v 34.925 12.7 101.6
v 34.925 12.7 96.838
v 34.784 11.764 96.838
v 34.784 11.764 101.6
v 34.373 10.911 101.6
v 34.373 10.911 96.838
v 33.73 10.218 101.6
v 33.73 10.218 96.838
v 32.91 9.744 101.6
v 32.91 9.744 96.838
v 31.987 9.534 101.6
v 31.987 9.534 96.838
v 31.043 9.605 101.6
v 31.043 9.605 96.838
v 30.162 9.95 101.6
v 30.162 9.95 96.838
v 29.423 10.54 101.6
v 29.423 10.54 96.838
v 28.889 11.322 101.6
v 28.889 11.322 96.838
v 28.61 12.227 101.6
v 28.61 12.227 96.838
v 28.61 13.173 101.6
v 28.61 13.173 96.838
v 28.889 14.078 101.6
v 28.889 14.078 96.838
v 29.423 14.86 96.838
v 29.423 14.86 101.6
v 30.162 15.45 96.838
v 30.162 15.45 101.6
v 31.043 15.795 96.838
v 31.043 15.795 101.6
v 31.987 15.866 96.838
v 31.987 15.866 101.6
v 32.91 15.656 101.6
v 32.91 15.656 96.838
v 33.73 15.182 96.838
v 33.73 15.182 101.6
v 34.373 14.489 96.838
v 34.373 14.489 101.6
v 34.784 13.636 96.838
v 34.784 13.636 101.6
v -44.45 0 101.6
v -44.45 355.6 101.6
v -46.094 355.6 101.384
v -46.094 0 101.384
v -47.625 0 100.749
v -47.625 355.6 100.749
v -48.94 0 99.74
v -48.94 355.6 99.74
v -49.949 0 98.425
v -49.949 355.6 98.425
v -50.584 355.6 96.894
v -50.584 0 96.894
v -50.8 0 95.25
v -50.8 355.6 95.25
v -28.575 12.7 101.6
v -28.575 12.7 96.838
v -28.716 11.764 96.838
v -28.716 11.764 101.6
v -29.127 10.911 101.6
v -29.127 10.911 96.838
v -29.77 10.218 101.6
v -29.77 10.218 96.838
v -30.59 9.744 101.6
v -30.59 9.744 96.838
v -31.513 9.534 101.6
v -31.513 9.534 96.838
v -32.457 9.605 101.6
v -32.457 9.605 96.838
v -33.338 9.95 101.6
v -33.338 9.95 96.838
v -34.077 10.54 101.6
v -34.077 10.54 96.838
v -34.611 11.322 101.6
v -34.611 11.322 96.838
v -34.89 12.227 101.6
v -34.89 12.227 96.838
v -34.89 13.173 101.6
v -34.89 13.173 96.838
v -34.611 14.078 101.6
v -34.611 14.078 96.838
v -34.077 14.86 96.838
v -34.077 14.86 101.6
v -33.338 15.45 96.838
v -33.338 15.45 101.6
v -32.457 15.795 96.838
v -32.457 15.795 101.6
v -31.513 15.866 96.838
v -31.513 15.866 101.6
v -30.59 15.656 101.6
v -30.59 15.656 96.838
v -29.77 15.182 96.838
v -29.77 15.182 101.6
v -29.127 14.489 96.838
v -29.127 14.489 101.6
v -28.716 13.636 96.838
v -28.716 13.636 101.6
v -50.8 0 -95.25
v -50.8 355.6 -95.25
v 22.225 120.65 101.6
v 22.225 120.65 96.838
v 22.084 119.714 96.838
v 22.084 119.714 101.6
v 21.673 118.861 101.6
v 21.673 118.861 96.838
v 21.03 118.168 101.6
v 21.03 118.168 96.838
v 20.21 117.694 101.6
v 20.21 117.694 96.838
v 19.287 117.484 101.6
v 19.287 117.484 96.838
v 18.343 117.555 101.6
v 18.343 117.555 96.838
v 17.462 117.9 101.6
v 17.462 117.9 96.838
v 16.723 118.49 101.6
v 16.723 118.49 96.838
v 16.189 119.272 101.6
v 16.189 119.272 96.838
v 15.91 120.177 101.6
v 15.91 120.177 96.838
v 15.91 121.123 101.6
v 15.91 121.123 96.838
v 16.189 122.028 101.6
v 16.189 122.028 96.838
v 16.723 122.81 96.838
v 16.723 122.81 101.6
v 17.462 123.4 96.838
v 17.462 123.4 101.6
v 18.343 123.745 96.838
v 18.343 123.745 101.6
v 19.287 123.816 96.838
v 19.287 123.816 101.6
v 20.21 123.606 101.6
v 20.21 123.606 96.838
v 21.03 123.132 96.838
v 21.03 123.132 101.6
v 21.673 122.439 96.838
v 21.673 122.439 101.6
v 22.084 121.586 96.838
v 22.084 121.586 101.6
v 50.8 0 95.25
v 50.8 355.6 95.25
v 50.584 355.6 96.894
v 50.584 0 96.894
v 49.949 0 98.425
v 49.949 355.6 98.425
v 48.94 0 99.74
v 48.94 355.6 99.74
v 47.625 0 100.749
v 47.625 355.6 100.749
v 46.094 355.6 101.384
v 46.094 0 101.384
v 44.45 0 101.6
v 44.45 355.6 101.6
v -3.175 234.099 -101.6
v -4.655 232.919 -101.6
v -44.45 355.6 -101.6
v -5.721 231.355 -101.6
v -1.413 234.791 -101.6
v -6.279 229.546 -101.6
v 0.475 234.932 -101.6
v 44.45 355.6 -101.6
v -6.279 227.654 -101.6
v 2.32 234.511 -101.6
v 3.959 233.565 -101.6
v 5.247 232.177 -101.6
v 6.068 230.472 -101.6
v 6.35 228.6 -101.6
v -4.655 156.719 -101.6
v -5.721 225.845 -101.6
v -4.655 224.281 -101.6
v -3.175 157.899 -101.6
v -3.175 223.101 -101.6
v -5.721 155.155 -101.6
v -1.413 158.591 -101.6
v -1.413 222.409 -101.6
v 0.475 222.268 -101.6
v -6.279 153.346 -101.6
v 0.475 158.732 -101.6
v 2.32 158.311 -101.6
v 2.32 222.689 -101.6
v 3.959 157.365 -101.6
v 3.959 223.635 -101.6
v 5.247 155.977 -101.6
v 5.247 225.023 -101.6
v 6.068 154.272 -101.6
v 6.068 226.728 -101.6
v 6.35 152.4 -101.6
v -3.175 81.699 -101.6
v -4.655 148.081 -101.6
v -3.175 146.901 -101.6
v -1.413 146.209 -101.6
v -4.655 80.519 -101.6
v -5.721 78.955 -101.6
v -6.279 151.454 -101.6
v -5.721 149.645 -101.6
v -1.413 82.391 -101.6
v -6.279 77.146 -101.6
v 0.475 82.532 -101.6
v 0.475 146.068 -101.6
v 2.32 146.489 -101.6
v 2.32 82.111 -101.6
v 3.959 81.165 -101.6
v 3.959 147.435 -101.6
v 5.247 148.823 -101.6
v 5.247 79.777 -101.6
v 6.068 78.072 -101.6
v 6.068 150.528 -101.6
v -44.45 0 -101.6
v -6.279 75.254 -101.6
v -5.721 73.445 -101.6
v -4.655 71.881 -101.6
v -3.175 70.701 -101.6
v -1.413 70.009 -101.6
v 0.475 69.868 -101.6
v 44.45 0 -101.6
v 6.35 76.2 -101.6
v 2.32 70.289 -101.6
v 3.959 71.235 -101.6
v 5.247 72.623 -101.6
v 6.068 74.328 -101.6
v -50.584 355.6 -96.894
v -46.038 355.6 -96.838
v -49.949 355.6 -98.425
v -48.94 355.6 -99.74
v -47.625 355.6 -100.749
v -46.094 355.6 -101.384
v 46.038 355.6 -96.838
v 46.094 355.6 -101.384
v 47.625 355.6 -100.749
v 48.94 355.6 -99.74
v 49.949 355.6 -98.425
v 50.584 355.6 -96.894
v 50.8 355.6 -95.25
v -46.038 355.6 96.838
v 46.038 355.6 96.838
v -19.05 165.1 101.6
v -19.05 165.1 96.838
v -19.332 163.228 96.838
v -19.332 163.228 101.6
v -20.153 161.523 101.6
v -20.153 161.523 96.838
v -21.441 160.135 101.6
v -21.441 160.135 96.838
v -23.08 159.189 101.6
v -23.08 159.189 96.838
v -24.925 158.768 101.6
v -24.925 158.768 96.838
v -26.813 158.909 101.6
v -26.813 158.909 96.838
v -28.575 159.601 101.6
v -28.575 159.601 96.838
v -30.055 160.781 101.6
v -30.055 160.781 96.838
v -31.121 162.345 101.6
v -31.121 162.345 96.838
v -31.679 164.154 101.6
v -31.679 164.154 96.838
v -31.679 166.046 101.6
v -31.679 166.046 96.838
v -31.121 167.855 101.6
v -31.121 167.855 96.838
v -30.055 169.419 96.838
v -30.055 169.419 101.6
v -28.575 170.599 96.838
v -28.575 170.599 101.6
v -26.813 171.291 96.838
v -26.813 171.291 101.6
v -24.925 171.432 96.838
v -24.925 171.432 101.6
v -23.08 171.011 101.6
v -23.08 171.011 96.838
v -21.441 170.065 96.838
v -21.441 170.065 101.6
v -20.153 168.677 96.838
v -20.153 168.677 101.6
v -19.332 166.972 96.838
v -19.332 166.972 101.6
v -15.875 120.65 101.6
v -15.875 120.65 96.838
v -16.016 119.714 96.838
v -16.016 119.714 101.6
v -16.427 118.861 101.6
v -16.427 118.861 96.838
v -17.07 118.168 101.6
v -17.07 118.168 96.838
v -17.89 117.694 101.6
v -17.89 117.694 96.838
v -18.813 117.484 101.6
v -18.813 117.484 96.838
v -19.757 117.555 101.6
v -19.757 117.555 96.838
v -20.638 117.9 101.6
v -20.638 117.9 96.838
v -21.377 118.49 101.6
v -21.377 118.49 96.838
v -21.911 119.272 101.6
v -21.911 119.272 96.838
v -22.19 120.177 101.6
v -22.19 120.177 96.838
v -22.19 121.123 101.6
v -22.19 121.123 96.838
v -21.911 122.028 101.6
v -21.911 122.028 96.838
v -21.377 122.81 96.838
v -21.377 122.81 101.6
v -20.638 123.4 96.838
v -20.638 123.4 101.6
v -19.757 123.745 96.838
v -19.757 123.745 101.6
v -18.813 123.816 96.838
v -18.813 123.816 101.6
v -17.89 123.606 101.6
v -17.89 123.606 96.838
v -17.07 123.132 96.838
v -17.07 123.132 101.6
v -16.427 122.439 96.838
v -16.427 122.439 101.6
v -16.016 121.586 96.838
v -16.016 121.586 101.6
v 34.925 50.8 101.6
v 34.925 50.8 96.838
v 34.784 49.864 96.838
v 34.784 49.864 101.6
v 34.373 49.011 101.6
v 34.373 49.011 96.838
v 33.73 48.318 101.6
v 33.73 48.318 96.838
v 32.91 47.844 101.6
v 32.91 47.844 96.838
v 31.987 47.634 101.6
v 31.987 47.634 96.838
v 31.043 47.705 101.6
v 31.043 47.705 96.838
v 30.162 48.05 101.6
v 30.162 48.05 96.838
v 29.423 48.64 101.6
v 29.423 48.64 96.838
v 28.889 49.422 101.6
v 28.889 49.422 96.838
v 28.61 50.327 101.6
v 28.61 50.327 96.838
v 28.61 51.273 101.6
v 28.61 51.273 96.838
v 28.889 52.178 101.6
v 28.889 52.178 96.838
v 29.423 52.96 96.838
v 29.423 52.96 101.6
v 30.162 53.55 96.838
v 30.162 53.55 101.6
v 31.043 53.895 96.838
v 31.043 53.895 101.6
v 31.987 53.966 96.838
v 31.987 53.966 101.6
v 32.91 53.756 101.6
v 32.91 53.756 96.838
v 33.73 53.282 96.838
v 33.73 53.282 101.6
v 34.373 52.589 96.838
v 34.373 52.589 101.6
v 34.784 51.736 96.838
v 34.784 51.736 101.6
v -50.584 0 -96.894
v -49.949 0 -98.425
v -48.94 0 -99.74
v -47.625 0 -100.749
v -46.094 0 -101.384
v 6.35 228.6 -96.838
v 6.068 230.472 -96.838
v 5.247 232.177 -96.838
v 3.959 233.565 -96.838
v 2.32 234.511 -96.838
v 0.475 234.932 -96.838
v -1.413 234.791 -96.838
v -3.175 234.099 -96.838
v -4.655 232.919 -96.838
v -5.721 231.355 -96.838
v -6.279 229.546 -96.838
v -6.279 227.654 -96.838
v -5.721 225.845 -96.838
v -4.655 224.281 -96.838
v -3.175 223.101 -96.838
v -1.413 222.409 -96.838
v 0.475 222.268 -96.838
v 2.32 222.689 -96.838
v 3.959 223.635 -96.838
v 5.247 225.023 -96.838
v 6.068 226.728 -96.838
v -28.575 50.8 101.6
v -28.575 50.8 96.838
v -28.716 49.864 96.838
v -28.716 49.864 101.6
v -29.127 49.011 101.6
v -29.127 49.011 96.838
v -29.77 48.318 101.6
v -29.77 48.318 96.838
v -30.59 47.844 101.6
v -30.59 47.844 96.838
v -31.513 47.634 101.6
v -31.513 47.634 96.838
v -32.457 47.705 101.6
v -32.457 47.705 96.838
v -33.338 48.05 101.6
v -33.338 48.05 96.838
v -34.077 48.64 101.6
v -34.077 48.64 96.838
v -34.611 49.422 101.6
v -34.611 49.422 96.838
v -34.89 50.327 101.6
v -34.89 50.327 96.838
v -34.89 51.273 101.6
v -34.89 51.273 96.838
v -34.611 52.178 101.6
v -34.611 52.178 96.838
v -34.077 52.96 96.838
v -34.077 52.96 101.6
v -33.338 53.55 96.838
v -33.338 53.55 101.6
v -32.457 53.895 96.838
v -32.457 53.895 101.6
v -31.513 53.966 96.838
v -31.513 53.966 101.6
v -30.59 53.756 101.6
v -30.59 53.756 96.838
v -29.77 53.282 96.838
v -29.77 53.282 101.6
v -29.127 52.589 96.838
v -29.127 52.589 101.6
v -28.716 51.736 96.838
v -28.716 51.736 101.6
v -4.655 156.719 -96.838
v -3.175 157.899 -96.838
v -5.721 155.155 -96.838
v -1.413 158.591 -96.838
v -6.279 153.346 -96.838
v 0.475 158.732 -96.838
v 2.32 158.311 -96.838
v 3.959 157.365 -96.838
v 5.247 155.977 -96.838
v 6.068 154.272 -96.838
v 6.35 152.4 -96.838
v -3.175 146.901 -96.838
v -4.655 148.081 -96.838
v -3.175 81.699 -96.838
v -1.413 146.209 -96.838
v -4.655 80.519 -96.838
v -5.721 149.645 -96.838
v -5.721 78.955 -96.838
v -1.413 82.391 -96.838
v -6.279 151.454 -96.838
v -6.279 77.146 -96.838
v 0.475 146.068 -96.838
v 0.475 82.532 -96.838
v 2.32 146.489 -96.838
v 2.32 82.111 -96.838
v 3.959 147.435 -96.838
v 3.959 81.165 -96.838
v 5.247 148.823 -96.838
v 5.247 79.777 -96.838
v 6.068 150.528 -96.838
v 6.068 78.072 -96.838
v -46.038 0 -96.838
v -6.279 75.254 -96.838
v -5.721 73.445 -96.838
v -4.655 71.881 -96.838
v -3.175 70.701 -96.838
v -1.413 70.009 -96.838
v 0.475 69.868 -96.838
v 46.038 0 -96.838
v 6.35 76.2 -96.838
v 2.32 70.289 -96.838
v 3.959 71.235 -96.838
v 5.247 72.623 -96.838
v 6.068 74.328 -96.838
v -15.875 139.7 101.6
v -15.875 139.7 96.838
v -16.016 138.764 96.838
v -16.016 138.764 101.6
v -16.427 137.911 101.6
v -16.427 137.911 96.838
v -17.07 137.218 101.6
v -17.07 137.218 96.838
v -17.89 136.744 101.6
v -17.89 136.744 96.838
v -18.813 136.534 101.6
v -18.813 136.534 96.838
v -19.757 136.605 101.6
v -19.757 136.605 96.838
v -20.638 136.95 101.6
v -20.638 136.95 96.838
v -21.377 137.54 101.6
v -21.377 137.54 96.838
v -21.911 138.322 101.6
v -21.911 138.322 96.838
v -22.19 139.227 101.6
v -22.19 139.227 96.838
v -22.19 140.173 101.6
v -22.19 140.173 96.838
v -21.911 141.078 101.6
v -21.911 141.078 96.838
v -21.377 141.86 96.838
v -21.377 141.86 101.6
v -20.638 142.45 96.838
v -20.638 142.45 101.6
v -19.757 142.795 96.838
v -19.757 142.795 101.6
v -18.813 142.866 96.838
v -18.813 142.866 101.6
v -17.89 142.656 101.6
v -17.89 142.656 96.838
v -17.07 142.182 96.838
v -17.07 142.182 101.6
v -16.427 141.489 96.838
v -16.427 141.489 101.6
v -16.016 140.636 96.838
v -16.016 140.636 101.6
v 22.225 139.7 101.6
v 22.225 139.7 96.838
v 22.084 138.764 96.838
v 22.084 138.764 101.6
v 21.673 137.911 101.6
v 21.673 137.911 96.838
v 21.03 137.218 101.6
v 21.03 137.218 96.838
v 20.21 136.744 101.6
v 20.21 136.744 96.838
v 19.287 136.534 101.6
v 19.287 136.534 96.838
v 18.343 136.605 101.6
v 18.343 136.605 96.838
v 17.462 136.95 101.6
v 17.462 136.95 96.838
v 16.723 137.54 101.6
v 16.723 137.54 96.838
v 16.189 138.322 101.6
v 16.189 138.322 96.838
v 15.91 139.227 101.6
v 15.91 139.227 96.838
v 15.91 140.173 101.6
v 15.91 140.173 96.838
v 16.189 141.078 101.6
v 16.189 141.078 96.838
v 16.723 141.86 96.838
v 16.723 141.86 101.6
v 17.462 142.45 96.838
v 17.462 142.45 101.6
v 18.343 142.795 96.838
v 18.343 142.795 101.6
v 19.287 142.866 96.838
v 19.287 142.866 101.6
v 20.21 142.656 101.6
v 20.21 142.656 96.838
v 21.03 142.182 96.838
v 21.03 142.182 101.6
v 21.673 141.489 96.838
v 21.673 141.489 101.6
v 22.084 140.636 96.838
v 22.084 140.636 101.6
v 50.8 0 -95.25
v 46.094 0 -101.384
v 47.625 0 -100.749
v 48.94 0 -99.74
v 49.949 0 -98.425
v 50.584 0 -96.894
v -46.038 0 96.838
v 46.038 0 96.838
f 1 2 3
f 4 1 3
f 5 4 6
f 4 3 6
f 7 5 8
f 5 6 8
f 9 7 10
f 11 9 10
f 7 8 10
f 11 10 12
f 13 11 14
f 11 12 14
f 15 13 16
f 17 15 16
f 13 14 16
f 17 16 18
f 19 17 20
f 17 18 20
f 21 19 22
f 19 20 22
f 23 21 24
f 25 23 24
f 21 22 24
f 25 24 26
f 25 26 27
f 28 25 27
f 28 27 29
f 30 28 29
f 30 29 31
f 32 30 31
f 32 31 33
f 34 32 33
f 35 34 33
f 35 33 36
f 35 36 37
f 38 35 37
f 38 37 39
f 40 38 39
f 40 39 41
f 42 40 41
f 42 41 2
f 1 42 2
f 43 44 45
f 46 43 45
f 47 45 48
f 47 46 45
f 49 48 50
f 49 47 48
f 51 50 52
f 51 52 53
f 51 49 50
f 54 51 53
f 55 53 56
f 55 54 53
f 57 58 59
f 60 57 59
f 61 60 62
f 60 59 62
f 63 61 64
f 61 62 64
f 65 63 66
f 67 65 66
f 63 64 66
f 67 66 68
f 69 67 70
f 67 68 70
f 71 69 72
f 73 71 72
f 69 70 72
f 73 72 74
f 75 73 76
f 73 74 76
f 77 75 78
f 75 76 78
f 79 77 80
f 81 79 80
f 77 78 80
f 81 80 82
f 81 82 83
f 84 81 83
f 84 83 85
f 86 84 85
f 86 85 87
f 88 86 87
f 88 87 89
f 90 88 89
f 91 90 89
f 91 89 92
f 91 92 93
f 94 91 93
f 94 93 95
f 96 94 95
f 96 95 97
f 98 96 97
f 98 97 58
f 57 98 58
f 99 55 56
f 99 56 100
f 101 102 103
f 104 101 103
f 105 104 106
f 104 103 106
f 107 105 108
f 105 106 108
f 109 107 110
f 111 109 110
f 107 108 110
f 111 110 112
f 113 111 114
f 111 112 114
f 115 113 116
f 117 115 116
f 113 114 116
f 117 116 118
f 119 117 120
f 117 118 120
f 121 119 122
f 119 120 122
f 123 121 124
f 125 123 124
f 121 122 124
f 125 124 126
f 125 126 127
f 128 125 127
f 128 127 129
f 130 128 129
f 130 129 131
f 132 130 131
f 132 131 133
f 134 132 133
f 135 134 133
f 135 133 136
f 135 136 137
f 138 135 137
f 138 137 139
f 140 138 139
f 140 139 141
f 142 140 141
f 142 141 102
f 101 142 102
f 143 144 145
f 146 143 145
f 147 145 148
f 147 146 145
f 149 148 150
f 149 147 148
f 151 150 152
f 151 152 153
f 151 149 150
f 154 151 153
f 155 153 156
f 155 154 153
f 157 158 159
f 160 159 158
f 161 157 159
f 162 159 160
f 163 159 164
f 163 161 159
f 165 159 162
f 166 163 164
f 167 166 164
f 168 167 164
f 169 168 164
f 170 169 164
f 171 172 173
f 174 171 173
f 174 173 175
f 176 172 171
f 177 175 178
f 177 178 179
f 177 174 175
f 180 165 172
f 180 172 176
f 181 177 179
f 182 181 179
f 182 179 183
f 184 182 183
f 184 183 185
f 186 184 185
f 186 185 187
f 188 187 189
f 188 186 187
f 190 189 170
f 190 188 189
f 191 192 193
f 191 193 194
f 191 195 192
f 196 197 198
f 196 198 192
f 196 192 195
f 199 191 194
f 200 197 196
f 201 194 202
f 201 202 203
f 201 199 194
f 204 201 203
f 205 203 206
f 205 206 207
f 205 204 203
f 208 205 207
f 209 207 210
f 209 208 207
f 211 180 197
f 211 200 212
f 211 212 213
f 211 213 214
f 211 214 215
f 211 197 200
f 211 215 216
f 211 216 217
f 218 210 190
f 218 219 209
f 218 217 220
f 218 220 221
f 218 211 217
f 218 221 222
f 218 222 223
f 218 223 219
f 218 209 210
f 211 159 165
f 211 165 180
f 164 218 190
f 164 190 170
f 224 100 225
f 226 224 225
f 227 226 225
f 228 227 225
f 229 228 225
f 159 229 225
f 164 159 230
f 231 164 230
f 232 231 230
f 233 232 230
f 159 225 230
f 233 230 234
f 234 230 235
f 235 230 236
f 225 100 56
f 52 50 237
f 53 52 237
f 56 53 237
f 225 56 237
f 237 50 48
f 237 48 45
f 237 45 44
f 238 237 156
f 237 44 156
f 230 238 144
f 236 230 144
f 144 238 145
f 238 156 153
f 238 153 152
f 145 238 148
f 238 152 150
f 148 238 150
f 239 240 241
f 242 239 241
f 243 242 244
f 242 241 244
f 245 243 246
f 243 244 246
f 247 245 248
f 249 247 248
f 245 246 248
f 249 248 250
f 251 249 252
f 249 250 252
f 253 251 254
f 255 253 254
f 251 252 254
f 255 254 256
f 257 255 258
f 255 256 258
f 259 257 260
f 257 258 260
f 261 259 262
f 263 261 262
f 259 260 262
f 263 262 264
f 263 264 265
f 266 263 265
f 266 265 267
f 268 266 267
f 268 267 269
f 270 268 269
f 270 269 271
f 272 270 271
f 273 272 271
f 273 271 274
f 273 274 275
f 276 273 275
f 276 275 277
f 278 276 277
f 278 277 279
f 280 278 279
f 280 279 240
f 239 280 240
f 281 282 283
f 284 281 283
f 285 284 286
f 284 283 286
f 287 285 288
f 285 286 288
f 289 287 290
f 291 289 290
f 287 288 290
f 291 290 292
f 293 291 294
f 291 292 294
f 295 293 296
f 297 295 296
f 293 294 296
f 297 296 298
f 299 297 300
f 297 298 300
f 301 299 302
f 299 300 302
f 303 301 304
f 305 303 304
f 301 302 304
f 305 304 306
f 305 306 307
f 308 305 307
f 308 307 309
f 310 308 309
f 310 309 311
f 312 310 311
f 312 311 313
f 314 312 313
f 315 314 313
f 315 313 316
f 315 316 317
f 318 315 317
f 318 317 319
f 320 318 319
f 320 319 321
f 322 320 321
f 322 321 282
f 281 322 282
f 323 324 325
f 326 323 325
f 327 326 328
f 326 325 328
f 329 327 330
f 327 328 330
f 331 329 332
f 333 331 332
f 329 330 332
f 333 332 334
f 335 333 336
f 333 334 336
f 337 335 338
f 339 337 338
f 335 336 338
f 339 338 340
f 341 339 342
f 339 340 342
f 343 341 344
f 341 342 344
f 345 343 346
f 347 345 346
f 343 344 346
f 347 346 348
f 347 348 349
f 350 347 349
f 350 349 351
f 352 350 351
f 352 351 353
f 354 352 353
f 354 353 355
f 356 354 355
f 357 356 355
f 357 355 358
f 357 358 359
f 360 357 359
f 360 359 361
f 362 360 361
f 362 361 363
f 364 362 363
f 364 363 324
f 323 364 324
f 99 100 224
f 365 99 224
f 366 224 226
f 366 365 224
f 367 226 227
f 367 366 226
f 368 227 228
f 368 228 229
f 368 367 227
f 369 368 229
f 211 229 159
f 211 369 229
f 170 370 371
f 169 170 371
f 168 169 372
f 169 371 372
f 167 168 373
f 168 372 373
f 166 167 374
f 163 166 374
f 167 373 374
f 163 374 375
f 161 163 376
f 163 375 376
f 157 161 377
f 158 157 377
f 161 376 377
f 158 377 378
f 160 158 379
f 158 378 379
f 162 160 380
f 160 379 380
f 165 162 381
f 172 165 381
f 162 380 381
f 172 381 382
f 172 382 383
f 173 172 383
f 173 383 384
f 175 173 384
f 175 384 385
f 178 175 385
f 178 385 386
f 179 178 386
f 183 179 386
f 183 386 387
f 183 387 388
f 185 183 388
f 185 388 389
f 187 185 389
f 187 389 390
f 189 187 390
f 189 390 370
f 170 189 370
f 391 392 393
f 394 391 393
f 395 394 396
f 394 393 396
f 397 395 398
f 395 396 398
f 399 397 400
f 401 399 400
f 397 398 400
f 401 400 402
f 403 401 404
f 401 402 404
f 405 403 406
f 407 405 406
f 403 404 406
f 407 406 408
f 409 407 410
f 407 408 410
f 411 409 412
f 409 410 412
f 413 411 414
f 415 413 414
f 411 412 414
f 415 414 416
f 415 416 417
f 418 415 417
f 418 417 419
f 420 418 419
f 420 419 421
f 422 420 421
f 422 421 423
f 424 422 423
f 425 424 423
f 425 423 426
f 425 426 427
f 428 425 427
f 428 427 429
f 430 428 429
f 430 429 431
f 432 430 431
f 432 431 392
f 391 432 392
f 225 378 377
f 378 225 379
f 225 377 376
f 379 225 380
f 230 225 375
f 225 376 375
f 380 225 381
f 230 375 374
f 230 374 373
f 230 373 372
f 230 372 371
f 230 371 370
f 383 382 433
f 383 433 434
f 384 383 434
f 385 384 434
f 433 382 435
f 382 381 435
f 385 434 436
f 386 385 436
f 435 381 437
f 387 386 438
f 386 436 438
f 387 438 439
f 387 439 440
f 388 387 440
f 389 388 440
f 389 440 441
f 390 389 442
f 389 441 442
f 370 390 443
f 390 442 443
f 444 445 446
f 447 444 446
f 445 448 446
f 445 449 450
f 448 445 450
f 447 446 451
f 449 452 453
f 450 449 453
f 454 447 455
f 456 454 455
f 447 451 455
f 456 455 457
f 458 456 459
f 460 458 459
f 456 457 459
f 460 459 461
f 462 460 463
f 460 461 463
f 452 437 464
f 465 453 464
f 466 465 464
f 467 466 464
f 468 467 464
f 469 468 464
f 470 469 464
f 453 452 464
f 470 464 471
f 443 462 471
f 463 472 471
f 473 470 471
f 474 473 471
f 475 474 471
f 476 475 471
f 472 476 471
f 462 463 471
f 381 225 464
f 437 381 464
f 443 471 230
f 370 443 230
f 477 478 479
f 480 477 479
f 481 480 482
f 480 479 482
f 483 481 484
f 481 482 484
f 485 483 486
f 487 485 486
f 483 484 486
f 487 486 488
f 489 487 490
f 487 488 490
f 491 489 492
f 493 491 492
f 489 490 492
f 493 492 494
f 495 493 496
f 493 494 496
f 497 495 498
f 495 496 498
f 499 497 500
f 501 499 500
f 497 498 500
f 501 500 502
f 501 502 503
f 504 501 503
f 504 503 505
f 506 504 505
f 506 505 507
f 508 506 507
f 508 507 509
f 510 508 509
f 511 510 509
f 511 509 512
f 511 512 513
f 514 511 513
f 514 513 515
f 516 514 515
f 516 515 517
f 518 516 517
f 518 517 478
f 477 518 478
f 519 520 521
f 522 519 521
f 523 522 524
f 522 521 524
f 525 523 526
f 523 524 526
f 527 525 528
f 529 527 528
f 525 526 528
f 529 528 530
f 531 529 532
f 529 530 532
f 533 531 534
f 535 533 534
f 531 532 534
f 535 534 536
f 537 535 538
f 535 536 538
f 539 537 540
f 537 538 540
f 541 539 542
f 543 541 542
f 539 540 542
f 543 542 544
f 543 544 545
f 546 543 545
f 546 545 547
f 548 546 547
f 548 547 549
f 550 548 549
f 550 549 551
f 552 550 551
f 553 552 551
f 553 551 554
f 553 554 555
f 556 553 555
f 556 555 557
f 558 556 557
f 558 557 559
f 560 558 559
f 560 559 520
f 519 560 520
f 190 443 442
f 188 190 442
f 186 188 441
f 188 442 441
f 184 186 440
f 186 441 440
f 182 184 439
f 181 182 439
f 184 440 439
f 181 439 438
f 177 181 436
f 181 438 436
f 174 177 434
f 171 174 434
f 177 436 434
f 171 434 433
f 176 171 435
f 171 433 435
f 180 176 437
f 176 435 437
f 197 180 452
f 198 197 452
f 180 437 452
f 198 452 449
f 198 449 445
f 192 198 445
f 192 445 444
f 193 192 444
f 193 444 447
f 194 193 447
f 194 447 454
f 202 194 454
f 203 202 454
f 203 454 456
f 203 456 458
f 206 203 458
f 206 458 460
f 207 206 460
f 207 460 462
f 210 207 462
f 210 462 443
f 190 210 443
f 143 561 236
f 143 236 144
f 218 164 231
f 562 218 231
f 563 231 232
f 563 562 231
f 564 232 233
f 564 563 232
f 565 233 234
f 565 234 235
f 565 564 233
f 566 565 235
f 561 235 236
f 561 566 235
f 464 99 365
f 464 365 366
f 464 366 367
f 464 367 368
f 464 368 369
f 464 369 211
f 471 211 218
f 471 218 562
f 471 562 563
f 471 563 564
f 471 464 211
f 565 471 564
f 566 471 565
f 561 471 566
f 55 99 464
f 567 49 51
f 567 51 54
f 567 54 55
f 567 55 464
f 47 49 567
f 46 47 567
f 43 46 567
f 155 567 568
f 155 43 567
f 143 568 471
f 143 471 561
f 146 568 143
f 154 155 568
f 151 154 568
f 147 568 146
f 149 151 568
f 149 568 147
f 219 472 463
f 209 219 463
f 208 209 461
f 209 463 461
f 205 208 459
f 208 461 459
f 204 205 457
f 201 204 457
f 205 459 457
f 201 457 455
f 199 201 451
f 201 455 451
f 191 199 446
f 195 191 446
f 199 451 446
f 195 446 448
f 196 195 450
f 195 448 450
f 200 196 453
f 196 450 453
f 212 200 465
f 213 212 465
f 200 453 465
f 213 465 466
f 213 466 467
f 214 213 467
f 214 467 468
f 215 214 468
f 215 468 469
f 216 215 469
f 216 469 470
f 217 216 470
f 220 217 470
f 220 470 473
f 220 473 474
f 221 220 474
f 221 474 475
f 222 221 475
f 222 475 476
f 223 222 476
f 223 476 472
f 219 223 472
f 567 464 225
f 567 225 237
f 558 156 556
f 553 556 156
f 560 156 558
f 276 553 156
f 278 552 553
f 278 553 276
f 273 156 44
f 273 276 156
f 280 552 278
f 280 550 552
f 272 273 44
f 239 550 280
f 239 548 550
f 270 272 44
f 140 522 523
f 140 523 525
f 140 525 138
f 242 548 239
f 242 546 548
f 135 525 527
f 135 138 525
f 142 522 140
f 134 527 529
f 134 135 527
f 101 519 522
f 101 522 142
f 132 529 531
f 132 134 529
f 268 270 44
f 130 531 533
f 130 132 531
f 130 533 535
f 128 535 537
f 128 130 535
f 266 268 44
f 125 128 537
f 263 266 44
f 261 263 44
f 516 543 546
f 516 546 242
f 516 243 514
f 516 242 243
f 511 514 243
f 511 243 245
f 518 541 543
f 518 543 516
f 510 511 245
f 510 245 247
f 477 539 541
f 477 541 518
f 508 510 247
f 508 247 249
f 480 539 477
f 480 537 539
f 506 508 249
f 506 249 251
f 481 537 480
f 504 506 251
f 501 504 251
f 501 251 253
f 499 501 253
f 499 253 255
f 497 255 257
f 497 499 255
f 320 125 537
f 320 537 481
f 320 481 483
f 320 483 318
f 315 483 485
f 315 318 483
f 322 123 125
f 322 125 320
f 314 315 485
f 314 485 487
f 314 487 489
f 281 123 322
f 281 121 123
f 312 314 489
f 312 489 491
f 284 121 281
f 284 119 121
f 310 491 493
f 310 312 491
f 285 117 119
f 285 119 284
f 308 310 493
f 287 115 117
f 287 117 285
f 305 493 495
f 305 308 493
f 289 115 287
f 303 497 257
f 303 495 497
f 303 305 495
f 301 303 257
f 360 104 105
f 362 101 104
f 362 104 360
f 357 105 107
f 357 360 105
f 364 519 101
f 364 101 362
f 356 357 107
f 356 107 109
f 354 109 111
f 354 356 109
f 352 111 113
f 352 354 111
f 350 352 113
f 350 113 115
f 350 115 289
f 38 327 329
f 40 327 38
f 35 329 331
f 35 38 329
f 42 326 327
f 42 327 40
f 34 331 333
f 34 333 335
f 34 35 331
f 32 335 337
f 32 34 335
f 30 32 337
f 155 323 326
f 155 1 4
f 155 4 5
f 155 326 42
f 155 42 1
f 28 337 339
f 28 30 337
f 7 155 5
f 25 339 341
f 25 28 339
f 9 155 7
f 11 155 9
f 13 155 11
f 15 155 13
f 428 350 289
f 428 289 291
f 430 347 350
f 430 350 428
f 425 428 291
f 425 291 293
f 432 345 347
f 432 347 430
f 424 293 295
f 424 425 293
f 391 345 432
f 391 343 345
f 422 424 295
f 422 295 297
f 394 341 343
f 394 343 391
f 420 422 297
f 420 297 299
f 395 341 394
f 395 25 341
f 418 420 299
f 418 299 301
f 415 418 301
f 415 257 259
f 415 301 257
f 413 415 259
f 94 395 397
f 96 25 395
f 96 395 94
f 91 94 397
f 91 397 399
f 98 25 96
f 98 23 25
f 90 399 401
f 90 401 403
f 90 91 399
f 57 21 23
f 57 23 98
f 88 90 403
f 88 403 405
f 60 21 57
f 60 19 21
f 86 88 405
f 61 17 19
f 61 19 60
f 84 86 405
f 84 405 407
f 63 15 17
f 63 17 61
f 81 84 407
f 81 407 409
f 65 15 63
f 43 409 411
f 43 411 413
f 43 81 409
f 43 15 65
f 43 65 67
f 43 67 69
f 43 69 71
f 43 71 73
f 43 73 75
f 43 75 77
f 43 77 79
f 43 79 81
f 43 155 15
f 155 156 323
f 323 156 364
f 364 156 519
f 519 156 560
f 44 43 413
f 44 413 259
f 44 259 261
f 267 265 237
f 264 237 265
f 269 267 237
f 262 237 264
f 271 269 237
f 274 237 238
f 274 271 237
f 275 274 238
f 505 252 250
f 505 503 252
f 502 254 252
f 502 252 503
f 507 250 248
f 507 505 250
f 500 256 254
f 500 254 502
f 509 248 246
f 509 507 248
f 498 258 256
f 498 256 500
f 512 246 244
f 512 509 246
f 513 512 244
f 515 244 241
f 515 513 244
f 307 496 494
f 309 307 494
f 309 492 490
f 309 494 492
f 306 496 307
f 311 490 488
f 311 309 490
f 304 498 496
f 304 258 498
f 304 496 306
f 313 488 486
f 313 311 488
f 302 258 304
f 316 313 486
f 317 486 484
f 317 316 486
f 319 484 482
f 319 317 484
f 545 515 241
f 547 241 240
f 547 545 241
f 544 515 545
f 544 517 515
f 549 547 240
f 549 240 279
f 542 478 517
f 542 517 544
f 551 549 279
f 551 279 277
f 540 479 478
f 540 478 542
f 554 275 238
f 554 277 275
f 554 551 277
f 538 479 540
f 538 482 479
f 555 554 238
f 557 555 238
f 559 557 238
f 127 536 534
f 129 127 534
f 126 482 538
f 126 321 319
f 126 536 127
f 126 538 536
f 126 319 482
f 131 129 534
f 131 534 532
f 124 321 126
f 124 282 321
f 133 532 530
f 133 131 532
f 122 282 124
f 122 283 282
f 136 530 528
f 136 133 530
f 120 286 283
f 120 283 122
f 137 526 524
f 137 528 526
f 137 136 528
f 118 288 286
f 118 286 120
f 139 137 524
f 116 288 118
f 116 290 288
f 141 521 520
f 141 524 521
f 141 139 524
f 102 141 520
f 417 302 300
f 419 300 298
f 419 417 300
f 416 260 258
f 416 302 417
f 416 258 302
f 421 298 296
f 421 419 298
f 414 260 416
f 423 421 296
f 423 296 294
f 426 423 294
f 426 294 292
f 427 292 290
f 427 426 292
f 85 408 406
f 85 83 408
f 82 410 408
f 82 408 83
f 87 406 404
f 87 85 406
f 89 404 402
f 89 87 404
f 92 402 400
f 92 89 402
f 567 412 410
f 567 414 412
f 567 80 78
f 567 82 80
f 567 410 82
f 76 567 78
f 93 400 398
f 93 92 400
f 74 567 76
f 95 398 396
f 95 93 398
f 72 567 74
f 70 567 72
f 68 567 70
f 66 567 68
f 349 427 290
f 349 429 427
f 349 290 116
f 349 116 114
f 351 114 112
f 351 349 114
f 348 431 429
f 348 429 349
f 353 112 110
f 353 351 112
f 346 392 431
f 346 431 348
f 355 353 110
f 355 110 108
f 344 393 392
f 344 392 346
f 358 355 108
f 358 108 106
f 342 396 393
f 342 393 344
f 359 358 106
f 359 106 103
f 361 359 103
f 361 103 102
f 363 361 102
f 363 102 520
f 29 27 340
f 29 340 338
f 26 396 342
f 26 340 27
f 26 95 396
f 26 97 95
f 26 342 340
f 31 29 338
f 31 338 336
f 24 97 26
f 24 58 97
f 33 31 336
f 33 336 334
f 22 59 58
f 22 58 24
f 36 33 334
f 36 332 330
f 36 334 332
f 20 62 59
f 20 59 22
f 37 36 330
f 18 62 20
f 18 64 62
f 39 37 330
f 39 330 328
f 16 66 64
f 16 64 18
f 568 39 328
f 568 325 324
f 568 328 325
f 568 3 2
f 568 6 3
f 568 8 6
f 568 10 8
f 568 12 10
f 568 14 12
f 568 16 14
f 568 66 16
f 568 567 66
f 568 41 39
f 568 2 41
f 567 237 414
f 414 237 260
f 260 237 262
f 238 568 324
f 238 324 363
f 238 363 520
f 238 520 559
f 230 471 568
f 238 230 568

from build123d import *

# Parameters (mm, degrees)
F3_W     = 92.075
F3_H     = 193.675
F4_DEPTH = 355.6
F0_D     = 12.7
F0_DEPTH = 101.601
F2_D     = 12.7
F2_DEPTH = 101.601
F6_D     = 6.35
F6_DEPTH = 101.601


with BuildPart() as f4:
    # F3 (on Front) → F4 (new body)
    with BuildSketch(Plane.XZ):
        with BuildLine():
            ThreePointArc((-50.8, -95.25), (-48.9401280605, -99.7401280605), (-44.45, -101.6))
            Line((-44.45, -101.6), (44.45, -101.6))
            ThreePointArc((44.45, -101.6), (48.9401280605, -99.7401280605), (50.8, -95.25))
            Line((50.8, -95.25), (50.8, 95.25))
            ThreePointArc((50.8, 95.25), (48.9401280605, 99.7401280605), (44.45, 101.6))
            Line((44.45, 101.6), (-44.45, 101.6))
            ThreePointArc((-44.45, 101.6), (-48.9401280605, 99.7401280605), (-50.8, 95.25))
            Line((-50.8, 95.25), (-50.8, -95.25))
        make_face()
        Rectangle(F3_W, F3_H, mode=Mode.SUBTRACT)
    extrude(amount=-F4_DEPTH)

    # F0 (through all, one way)
    with BuildSketch(Plane.XY):
        with Locations((0, 228.6), (0, 152.4), (0, 76.2)):
            Circle(F0_D / 2)
    extrude(amount=-F0_DEPTH, mode=Mode.SUBTRACT)

    # F2 (through all, one way)
    with BuildSketch(Plane(origin=(0, 0, 0), x_dir=(1, 0, 0), z_dir=(0, 0, -1))):
        with Locations((-25.4, -165.1)):
            Circle(F2_D / 2)
    extrude(amount=-F2_DEPTH, mode=Mode.SUBTRACT)

    # F6 (through all, one way)
    with BuildSketch(Plane(origin=(0, 0, 0), x_dir=(1, 0, 0), z_dir=(0, 0, -1))):
        with Locations((31.75, -12.7), (-31.75, -12.7), (-31.75, -50.8), (31.75, -50.8), (19.05, -139.7), (-19.05, -139.7), (19.05, -120.65), (-19.05, -120.65)):
            Circle(F6_D / 2)
    extrude(amount=-F6_DEPTH, mode=Mode.SUBTRACT)


solid = f4.part
